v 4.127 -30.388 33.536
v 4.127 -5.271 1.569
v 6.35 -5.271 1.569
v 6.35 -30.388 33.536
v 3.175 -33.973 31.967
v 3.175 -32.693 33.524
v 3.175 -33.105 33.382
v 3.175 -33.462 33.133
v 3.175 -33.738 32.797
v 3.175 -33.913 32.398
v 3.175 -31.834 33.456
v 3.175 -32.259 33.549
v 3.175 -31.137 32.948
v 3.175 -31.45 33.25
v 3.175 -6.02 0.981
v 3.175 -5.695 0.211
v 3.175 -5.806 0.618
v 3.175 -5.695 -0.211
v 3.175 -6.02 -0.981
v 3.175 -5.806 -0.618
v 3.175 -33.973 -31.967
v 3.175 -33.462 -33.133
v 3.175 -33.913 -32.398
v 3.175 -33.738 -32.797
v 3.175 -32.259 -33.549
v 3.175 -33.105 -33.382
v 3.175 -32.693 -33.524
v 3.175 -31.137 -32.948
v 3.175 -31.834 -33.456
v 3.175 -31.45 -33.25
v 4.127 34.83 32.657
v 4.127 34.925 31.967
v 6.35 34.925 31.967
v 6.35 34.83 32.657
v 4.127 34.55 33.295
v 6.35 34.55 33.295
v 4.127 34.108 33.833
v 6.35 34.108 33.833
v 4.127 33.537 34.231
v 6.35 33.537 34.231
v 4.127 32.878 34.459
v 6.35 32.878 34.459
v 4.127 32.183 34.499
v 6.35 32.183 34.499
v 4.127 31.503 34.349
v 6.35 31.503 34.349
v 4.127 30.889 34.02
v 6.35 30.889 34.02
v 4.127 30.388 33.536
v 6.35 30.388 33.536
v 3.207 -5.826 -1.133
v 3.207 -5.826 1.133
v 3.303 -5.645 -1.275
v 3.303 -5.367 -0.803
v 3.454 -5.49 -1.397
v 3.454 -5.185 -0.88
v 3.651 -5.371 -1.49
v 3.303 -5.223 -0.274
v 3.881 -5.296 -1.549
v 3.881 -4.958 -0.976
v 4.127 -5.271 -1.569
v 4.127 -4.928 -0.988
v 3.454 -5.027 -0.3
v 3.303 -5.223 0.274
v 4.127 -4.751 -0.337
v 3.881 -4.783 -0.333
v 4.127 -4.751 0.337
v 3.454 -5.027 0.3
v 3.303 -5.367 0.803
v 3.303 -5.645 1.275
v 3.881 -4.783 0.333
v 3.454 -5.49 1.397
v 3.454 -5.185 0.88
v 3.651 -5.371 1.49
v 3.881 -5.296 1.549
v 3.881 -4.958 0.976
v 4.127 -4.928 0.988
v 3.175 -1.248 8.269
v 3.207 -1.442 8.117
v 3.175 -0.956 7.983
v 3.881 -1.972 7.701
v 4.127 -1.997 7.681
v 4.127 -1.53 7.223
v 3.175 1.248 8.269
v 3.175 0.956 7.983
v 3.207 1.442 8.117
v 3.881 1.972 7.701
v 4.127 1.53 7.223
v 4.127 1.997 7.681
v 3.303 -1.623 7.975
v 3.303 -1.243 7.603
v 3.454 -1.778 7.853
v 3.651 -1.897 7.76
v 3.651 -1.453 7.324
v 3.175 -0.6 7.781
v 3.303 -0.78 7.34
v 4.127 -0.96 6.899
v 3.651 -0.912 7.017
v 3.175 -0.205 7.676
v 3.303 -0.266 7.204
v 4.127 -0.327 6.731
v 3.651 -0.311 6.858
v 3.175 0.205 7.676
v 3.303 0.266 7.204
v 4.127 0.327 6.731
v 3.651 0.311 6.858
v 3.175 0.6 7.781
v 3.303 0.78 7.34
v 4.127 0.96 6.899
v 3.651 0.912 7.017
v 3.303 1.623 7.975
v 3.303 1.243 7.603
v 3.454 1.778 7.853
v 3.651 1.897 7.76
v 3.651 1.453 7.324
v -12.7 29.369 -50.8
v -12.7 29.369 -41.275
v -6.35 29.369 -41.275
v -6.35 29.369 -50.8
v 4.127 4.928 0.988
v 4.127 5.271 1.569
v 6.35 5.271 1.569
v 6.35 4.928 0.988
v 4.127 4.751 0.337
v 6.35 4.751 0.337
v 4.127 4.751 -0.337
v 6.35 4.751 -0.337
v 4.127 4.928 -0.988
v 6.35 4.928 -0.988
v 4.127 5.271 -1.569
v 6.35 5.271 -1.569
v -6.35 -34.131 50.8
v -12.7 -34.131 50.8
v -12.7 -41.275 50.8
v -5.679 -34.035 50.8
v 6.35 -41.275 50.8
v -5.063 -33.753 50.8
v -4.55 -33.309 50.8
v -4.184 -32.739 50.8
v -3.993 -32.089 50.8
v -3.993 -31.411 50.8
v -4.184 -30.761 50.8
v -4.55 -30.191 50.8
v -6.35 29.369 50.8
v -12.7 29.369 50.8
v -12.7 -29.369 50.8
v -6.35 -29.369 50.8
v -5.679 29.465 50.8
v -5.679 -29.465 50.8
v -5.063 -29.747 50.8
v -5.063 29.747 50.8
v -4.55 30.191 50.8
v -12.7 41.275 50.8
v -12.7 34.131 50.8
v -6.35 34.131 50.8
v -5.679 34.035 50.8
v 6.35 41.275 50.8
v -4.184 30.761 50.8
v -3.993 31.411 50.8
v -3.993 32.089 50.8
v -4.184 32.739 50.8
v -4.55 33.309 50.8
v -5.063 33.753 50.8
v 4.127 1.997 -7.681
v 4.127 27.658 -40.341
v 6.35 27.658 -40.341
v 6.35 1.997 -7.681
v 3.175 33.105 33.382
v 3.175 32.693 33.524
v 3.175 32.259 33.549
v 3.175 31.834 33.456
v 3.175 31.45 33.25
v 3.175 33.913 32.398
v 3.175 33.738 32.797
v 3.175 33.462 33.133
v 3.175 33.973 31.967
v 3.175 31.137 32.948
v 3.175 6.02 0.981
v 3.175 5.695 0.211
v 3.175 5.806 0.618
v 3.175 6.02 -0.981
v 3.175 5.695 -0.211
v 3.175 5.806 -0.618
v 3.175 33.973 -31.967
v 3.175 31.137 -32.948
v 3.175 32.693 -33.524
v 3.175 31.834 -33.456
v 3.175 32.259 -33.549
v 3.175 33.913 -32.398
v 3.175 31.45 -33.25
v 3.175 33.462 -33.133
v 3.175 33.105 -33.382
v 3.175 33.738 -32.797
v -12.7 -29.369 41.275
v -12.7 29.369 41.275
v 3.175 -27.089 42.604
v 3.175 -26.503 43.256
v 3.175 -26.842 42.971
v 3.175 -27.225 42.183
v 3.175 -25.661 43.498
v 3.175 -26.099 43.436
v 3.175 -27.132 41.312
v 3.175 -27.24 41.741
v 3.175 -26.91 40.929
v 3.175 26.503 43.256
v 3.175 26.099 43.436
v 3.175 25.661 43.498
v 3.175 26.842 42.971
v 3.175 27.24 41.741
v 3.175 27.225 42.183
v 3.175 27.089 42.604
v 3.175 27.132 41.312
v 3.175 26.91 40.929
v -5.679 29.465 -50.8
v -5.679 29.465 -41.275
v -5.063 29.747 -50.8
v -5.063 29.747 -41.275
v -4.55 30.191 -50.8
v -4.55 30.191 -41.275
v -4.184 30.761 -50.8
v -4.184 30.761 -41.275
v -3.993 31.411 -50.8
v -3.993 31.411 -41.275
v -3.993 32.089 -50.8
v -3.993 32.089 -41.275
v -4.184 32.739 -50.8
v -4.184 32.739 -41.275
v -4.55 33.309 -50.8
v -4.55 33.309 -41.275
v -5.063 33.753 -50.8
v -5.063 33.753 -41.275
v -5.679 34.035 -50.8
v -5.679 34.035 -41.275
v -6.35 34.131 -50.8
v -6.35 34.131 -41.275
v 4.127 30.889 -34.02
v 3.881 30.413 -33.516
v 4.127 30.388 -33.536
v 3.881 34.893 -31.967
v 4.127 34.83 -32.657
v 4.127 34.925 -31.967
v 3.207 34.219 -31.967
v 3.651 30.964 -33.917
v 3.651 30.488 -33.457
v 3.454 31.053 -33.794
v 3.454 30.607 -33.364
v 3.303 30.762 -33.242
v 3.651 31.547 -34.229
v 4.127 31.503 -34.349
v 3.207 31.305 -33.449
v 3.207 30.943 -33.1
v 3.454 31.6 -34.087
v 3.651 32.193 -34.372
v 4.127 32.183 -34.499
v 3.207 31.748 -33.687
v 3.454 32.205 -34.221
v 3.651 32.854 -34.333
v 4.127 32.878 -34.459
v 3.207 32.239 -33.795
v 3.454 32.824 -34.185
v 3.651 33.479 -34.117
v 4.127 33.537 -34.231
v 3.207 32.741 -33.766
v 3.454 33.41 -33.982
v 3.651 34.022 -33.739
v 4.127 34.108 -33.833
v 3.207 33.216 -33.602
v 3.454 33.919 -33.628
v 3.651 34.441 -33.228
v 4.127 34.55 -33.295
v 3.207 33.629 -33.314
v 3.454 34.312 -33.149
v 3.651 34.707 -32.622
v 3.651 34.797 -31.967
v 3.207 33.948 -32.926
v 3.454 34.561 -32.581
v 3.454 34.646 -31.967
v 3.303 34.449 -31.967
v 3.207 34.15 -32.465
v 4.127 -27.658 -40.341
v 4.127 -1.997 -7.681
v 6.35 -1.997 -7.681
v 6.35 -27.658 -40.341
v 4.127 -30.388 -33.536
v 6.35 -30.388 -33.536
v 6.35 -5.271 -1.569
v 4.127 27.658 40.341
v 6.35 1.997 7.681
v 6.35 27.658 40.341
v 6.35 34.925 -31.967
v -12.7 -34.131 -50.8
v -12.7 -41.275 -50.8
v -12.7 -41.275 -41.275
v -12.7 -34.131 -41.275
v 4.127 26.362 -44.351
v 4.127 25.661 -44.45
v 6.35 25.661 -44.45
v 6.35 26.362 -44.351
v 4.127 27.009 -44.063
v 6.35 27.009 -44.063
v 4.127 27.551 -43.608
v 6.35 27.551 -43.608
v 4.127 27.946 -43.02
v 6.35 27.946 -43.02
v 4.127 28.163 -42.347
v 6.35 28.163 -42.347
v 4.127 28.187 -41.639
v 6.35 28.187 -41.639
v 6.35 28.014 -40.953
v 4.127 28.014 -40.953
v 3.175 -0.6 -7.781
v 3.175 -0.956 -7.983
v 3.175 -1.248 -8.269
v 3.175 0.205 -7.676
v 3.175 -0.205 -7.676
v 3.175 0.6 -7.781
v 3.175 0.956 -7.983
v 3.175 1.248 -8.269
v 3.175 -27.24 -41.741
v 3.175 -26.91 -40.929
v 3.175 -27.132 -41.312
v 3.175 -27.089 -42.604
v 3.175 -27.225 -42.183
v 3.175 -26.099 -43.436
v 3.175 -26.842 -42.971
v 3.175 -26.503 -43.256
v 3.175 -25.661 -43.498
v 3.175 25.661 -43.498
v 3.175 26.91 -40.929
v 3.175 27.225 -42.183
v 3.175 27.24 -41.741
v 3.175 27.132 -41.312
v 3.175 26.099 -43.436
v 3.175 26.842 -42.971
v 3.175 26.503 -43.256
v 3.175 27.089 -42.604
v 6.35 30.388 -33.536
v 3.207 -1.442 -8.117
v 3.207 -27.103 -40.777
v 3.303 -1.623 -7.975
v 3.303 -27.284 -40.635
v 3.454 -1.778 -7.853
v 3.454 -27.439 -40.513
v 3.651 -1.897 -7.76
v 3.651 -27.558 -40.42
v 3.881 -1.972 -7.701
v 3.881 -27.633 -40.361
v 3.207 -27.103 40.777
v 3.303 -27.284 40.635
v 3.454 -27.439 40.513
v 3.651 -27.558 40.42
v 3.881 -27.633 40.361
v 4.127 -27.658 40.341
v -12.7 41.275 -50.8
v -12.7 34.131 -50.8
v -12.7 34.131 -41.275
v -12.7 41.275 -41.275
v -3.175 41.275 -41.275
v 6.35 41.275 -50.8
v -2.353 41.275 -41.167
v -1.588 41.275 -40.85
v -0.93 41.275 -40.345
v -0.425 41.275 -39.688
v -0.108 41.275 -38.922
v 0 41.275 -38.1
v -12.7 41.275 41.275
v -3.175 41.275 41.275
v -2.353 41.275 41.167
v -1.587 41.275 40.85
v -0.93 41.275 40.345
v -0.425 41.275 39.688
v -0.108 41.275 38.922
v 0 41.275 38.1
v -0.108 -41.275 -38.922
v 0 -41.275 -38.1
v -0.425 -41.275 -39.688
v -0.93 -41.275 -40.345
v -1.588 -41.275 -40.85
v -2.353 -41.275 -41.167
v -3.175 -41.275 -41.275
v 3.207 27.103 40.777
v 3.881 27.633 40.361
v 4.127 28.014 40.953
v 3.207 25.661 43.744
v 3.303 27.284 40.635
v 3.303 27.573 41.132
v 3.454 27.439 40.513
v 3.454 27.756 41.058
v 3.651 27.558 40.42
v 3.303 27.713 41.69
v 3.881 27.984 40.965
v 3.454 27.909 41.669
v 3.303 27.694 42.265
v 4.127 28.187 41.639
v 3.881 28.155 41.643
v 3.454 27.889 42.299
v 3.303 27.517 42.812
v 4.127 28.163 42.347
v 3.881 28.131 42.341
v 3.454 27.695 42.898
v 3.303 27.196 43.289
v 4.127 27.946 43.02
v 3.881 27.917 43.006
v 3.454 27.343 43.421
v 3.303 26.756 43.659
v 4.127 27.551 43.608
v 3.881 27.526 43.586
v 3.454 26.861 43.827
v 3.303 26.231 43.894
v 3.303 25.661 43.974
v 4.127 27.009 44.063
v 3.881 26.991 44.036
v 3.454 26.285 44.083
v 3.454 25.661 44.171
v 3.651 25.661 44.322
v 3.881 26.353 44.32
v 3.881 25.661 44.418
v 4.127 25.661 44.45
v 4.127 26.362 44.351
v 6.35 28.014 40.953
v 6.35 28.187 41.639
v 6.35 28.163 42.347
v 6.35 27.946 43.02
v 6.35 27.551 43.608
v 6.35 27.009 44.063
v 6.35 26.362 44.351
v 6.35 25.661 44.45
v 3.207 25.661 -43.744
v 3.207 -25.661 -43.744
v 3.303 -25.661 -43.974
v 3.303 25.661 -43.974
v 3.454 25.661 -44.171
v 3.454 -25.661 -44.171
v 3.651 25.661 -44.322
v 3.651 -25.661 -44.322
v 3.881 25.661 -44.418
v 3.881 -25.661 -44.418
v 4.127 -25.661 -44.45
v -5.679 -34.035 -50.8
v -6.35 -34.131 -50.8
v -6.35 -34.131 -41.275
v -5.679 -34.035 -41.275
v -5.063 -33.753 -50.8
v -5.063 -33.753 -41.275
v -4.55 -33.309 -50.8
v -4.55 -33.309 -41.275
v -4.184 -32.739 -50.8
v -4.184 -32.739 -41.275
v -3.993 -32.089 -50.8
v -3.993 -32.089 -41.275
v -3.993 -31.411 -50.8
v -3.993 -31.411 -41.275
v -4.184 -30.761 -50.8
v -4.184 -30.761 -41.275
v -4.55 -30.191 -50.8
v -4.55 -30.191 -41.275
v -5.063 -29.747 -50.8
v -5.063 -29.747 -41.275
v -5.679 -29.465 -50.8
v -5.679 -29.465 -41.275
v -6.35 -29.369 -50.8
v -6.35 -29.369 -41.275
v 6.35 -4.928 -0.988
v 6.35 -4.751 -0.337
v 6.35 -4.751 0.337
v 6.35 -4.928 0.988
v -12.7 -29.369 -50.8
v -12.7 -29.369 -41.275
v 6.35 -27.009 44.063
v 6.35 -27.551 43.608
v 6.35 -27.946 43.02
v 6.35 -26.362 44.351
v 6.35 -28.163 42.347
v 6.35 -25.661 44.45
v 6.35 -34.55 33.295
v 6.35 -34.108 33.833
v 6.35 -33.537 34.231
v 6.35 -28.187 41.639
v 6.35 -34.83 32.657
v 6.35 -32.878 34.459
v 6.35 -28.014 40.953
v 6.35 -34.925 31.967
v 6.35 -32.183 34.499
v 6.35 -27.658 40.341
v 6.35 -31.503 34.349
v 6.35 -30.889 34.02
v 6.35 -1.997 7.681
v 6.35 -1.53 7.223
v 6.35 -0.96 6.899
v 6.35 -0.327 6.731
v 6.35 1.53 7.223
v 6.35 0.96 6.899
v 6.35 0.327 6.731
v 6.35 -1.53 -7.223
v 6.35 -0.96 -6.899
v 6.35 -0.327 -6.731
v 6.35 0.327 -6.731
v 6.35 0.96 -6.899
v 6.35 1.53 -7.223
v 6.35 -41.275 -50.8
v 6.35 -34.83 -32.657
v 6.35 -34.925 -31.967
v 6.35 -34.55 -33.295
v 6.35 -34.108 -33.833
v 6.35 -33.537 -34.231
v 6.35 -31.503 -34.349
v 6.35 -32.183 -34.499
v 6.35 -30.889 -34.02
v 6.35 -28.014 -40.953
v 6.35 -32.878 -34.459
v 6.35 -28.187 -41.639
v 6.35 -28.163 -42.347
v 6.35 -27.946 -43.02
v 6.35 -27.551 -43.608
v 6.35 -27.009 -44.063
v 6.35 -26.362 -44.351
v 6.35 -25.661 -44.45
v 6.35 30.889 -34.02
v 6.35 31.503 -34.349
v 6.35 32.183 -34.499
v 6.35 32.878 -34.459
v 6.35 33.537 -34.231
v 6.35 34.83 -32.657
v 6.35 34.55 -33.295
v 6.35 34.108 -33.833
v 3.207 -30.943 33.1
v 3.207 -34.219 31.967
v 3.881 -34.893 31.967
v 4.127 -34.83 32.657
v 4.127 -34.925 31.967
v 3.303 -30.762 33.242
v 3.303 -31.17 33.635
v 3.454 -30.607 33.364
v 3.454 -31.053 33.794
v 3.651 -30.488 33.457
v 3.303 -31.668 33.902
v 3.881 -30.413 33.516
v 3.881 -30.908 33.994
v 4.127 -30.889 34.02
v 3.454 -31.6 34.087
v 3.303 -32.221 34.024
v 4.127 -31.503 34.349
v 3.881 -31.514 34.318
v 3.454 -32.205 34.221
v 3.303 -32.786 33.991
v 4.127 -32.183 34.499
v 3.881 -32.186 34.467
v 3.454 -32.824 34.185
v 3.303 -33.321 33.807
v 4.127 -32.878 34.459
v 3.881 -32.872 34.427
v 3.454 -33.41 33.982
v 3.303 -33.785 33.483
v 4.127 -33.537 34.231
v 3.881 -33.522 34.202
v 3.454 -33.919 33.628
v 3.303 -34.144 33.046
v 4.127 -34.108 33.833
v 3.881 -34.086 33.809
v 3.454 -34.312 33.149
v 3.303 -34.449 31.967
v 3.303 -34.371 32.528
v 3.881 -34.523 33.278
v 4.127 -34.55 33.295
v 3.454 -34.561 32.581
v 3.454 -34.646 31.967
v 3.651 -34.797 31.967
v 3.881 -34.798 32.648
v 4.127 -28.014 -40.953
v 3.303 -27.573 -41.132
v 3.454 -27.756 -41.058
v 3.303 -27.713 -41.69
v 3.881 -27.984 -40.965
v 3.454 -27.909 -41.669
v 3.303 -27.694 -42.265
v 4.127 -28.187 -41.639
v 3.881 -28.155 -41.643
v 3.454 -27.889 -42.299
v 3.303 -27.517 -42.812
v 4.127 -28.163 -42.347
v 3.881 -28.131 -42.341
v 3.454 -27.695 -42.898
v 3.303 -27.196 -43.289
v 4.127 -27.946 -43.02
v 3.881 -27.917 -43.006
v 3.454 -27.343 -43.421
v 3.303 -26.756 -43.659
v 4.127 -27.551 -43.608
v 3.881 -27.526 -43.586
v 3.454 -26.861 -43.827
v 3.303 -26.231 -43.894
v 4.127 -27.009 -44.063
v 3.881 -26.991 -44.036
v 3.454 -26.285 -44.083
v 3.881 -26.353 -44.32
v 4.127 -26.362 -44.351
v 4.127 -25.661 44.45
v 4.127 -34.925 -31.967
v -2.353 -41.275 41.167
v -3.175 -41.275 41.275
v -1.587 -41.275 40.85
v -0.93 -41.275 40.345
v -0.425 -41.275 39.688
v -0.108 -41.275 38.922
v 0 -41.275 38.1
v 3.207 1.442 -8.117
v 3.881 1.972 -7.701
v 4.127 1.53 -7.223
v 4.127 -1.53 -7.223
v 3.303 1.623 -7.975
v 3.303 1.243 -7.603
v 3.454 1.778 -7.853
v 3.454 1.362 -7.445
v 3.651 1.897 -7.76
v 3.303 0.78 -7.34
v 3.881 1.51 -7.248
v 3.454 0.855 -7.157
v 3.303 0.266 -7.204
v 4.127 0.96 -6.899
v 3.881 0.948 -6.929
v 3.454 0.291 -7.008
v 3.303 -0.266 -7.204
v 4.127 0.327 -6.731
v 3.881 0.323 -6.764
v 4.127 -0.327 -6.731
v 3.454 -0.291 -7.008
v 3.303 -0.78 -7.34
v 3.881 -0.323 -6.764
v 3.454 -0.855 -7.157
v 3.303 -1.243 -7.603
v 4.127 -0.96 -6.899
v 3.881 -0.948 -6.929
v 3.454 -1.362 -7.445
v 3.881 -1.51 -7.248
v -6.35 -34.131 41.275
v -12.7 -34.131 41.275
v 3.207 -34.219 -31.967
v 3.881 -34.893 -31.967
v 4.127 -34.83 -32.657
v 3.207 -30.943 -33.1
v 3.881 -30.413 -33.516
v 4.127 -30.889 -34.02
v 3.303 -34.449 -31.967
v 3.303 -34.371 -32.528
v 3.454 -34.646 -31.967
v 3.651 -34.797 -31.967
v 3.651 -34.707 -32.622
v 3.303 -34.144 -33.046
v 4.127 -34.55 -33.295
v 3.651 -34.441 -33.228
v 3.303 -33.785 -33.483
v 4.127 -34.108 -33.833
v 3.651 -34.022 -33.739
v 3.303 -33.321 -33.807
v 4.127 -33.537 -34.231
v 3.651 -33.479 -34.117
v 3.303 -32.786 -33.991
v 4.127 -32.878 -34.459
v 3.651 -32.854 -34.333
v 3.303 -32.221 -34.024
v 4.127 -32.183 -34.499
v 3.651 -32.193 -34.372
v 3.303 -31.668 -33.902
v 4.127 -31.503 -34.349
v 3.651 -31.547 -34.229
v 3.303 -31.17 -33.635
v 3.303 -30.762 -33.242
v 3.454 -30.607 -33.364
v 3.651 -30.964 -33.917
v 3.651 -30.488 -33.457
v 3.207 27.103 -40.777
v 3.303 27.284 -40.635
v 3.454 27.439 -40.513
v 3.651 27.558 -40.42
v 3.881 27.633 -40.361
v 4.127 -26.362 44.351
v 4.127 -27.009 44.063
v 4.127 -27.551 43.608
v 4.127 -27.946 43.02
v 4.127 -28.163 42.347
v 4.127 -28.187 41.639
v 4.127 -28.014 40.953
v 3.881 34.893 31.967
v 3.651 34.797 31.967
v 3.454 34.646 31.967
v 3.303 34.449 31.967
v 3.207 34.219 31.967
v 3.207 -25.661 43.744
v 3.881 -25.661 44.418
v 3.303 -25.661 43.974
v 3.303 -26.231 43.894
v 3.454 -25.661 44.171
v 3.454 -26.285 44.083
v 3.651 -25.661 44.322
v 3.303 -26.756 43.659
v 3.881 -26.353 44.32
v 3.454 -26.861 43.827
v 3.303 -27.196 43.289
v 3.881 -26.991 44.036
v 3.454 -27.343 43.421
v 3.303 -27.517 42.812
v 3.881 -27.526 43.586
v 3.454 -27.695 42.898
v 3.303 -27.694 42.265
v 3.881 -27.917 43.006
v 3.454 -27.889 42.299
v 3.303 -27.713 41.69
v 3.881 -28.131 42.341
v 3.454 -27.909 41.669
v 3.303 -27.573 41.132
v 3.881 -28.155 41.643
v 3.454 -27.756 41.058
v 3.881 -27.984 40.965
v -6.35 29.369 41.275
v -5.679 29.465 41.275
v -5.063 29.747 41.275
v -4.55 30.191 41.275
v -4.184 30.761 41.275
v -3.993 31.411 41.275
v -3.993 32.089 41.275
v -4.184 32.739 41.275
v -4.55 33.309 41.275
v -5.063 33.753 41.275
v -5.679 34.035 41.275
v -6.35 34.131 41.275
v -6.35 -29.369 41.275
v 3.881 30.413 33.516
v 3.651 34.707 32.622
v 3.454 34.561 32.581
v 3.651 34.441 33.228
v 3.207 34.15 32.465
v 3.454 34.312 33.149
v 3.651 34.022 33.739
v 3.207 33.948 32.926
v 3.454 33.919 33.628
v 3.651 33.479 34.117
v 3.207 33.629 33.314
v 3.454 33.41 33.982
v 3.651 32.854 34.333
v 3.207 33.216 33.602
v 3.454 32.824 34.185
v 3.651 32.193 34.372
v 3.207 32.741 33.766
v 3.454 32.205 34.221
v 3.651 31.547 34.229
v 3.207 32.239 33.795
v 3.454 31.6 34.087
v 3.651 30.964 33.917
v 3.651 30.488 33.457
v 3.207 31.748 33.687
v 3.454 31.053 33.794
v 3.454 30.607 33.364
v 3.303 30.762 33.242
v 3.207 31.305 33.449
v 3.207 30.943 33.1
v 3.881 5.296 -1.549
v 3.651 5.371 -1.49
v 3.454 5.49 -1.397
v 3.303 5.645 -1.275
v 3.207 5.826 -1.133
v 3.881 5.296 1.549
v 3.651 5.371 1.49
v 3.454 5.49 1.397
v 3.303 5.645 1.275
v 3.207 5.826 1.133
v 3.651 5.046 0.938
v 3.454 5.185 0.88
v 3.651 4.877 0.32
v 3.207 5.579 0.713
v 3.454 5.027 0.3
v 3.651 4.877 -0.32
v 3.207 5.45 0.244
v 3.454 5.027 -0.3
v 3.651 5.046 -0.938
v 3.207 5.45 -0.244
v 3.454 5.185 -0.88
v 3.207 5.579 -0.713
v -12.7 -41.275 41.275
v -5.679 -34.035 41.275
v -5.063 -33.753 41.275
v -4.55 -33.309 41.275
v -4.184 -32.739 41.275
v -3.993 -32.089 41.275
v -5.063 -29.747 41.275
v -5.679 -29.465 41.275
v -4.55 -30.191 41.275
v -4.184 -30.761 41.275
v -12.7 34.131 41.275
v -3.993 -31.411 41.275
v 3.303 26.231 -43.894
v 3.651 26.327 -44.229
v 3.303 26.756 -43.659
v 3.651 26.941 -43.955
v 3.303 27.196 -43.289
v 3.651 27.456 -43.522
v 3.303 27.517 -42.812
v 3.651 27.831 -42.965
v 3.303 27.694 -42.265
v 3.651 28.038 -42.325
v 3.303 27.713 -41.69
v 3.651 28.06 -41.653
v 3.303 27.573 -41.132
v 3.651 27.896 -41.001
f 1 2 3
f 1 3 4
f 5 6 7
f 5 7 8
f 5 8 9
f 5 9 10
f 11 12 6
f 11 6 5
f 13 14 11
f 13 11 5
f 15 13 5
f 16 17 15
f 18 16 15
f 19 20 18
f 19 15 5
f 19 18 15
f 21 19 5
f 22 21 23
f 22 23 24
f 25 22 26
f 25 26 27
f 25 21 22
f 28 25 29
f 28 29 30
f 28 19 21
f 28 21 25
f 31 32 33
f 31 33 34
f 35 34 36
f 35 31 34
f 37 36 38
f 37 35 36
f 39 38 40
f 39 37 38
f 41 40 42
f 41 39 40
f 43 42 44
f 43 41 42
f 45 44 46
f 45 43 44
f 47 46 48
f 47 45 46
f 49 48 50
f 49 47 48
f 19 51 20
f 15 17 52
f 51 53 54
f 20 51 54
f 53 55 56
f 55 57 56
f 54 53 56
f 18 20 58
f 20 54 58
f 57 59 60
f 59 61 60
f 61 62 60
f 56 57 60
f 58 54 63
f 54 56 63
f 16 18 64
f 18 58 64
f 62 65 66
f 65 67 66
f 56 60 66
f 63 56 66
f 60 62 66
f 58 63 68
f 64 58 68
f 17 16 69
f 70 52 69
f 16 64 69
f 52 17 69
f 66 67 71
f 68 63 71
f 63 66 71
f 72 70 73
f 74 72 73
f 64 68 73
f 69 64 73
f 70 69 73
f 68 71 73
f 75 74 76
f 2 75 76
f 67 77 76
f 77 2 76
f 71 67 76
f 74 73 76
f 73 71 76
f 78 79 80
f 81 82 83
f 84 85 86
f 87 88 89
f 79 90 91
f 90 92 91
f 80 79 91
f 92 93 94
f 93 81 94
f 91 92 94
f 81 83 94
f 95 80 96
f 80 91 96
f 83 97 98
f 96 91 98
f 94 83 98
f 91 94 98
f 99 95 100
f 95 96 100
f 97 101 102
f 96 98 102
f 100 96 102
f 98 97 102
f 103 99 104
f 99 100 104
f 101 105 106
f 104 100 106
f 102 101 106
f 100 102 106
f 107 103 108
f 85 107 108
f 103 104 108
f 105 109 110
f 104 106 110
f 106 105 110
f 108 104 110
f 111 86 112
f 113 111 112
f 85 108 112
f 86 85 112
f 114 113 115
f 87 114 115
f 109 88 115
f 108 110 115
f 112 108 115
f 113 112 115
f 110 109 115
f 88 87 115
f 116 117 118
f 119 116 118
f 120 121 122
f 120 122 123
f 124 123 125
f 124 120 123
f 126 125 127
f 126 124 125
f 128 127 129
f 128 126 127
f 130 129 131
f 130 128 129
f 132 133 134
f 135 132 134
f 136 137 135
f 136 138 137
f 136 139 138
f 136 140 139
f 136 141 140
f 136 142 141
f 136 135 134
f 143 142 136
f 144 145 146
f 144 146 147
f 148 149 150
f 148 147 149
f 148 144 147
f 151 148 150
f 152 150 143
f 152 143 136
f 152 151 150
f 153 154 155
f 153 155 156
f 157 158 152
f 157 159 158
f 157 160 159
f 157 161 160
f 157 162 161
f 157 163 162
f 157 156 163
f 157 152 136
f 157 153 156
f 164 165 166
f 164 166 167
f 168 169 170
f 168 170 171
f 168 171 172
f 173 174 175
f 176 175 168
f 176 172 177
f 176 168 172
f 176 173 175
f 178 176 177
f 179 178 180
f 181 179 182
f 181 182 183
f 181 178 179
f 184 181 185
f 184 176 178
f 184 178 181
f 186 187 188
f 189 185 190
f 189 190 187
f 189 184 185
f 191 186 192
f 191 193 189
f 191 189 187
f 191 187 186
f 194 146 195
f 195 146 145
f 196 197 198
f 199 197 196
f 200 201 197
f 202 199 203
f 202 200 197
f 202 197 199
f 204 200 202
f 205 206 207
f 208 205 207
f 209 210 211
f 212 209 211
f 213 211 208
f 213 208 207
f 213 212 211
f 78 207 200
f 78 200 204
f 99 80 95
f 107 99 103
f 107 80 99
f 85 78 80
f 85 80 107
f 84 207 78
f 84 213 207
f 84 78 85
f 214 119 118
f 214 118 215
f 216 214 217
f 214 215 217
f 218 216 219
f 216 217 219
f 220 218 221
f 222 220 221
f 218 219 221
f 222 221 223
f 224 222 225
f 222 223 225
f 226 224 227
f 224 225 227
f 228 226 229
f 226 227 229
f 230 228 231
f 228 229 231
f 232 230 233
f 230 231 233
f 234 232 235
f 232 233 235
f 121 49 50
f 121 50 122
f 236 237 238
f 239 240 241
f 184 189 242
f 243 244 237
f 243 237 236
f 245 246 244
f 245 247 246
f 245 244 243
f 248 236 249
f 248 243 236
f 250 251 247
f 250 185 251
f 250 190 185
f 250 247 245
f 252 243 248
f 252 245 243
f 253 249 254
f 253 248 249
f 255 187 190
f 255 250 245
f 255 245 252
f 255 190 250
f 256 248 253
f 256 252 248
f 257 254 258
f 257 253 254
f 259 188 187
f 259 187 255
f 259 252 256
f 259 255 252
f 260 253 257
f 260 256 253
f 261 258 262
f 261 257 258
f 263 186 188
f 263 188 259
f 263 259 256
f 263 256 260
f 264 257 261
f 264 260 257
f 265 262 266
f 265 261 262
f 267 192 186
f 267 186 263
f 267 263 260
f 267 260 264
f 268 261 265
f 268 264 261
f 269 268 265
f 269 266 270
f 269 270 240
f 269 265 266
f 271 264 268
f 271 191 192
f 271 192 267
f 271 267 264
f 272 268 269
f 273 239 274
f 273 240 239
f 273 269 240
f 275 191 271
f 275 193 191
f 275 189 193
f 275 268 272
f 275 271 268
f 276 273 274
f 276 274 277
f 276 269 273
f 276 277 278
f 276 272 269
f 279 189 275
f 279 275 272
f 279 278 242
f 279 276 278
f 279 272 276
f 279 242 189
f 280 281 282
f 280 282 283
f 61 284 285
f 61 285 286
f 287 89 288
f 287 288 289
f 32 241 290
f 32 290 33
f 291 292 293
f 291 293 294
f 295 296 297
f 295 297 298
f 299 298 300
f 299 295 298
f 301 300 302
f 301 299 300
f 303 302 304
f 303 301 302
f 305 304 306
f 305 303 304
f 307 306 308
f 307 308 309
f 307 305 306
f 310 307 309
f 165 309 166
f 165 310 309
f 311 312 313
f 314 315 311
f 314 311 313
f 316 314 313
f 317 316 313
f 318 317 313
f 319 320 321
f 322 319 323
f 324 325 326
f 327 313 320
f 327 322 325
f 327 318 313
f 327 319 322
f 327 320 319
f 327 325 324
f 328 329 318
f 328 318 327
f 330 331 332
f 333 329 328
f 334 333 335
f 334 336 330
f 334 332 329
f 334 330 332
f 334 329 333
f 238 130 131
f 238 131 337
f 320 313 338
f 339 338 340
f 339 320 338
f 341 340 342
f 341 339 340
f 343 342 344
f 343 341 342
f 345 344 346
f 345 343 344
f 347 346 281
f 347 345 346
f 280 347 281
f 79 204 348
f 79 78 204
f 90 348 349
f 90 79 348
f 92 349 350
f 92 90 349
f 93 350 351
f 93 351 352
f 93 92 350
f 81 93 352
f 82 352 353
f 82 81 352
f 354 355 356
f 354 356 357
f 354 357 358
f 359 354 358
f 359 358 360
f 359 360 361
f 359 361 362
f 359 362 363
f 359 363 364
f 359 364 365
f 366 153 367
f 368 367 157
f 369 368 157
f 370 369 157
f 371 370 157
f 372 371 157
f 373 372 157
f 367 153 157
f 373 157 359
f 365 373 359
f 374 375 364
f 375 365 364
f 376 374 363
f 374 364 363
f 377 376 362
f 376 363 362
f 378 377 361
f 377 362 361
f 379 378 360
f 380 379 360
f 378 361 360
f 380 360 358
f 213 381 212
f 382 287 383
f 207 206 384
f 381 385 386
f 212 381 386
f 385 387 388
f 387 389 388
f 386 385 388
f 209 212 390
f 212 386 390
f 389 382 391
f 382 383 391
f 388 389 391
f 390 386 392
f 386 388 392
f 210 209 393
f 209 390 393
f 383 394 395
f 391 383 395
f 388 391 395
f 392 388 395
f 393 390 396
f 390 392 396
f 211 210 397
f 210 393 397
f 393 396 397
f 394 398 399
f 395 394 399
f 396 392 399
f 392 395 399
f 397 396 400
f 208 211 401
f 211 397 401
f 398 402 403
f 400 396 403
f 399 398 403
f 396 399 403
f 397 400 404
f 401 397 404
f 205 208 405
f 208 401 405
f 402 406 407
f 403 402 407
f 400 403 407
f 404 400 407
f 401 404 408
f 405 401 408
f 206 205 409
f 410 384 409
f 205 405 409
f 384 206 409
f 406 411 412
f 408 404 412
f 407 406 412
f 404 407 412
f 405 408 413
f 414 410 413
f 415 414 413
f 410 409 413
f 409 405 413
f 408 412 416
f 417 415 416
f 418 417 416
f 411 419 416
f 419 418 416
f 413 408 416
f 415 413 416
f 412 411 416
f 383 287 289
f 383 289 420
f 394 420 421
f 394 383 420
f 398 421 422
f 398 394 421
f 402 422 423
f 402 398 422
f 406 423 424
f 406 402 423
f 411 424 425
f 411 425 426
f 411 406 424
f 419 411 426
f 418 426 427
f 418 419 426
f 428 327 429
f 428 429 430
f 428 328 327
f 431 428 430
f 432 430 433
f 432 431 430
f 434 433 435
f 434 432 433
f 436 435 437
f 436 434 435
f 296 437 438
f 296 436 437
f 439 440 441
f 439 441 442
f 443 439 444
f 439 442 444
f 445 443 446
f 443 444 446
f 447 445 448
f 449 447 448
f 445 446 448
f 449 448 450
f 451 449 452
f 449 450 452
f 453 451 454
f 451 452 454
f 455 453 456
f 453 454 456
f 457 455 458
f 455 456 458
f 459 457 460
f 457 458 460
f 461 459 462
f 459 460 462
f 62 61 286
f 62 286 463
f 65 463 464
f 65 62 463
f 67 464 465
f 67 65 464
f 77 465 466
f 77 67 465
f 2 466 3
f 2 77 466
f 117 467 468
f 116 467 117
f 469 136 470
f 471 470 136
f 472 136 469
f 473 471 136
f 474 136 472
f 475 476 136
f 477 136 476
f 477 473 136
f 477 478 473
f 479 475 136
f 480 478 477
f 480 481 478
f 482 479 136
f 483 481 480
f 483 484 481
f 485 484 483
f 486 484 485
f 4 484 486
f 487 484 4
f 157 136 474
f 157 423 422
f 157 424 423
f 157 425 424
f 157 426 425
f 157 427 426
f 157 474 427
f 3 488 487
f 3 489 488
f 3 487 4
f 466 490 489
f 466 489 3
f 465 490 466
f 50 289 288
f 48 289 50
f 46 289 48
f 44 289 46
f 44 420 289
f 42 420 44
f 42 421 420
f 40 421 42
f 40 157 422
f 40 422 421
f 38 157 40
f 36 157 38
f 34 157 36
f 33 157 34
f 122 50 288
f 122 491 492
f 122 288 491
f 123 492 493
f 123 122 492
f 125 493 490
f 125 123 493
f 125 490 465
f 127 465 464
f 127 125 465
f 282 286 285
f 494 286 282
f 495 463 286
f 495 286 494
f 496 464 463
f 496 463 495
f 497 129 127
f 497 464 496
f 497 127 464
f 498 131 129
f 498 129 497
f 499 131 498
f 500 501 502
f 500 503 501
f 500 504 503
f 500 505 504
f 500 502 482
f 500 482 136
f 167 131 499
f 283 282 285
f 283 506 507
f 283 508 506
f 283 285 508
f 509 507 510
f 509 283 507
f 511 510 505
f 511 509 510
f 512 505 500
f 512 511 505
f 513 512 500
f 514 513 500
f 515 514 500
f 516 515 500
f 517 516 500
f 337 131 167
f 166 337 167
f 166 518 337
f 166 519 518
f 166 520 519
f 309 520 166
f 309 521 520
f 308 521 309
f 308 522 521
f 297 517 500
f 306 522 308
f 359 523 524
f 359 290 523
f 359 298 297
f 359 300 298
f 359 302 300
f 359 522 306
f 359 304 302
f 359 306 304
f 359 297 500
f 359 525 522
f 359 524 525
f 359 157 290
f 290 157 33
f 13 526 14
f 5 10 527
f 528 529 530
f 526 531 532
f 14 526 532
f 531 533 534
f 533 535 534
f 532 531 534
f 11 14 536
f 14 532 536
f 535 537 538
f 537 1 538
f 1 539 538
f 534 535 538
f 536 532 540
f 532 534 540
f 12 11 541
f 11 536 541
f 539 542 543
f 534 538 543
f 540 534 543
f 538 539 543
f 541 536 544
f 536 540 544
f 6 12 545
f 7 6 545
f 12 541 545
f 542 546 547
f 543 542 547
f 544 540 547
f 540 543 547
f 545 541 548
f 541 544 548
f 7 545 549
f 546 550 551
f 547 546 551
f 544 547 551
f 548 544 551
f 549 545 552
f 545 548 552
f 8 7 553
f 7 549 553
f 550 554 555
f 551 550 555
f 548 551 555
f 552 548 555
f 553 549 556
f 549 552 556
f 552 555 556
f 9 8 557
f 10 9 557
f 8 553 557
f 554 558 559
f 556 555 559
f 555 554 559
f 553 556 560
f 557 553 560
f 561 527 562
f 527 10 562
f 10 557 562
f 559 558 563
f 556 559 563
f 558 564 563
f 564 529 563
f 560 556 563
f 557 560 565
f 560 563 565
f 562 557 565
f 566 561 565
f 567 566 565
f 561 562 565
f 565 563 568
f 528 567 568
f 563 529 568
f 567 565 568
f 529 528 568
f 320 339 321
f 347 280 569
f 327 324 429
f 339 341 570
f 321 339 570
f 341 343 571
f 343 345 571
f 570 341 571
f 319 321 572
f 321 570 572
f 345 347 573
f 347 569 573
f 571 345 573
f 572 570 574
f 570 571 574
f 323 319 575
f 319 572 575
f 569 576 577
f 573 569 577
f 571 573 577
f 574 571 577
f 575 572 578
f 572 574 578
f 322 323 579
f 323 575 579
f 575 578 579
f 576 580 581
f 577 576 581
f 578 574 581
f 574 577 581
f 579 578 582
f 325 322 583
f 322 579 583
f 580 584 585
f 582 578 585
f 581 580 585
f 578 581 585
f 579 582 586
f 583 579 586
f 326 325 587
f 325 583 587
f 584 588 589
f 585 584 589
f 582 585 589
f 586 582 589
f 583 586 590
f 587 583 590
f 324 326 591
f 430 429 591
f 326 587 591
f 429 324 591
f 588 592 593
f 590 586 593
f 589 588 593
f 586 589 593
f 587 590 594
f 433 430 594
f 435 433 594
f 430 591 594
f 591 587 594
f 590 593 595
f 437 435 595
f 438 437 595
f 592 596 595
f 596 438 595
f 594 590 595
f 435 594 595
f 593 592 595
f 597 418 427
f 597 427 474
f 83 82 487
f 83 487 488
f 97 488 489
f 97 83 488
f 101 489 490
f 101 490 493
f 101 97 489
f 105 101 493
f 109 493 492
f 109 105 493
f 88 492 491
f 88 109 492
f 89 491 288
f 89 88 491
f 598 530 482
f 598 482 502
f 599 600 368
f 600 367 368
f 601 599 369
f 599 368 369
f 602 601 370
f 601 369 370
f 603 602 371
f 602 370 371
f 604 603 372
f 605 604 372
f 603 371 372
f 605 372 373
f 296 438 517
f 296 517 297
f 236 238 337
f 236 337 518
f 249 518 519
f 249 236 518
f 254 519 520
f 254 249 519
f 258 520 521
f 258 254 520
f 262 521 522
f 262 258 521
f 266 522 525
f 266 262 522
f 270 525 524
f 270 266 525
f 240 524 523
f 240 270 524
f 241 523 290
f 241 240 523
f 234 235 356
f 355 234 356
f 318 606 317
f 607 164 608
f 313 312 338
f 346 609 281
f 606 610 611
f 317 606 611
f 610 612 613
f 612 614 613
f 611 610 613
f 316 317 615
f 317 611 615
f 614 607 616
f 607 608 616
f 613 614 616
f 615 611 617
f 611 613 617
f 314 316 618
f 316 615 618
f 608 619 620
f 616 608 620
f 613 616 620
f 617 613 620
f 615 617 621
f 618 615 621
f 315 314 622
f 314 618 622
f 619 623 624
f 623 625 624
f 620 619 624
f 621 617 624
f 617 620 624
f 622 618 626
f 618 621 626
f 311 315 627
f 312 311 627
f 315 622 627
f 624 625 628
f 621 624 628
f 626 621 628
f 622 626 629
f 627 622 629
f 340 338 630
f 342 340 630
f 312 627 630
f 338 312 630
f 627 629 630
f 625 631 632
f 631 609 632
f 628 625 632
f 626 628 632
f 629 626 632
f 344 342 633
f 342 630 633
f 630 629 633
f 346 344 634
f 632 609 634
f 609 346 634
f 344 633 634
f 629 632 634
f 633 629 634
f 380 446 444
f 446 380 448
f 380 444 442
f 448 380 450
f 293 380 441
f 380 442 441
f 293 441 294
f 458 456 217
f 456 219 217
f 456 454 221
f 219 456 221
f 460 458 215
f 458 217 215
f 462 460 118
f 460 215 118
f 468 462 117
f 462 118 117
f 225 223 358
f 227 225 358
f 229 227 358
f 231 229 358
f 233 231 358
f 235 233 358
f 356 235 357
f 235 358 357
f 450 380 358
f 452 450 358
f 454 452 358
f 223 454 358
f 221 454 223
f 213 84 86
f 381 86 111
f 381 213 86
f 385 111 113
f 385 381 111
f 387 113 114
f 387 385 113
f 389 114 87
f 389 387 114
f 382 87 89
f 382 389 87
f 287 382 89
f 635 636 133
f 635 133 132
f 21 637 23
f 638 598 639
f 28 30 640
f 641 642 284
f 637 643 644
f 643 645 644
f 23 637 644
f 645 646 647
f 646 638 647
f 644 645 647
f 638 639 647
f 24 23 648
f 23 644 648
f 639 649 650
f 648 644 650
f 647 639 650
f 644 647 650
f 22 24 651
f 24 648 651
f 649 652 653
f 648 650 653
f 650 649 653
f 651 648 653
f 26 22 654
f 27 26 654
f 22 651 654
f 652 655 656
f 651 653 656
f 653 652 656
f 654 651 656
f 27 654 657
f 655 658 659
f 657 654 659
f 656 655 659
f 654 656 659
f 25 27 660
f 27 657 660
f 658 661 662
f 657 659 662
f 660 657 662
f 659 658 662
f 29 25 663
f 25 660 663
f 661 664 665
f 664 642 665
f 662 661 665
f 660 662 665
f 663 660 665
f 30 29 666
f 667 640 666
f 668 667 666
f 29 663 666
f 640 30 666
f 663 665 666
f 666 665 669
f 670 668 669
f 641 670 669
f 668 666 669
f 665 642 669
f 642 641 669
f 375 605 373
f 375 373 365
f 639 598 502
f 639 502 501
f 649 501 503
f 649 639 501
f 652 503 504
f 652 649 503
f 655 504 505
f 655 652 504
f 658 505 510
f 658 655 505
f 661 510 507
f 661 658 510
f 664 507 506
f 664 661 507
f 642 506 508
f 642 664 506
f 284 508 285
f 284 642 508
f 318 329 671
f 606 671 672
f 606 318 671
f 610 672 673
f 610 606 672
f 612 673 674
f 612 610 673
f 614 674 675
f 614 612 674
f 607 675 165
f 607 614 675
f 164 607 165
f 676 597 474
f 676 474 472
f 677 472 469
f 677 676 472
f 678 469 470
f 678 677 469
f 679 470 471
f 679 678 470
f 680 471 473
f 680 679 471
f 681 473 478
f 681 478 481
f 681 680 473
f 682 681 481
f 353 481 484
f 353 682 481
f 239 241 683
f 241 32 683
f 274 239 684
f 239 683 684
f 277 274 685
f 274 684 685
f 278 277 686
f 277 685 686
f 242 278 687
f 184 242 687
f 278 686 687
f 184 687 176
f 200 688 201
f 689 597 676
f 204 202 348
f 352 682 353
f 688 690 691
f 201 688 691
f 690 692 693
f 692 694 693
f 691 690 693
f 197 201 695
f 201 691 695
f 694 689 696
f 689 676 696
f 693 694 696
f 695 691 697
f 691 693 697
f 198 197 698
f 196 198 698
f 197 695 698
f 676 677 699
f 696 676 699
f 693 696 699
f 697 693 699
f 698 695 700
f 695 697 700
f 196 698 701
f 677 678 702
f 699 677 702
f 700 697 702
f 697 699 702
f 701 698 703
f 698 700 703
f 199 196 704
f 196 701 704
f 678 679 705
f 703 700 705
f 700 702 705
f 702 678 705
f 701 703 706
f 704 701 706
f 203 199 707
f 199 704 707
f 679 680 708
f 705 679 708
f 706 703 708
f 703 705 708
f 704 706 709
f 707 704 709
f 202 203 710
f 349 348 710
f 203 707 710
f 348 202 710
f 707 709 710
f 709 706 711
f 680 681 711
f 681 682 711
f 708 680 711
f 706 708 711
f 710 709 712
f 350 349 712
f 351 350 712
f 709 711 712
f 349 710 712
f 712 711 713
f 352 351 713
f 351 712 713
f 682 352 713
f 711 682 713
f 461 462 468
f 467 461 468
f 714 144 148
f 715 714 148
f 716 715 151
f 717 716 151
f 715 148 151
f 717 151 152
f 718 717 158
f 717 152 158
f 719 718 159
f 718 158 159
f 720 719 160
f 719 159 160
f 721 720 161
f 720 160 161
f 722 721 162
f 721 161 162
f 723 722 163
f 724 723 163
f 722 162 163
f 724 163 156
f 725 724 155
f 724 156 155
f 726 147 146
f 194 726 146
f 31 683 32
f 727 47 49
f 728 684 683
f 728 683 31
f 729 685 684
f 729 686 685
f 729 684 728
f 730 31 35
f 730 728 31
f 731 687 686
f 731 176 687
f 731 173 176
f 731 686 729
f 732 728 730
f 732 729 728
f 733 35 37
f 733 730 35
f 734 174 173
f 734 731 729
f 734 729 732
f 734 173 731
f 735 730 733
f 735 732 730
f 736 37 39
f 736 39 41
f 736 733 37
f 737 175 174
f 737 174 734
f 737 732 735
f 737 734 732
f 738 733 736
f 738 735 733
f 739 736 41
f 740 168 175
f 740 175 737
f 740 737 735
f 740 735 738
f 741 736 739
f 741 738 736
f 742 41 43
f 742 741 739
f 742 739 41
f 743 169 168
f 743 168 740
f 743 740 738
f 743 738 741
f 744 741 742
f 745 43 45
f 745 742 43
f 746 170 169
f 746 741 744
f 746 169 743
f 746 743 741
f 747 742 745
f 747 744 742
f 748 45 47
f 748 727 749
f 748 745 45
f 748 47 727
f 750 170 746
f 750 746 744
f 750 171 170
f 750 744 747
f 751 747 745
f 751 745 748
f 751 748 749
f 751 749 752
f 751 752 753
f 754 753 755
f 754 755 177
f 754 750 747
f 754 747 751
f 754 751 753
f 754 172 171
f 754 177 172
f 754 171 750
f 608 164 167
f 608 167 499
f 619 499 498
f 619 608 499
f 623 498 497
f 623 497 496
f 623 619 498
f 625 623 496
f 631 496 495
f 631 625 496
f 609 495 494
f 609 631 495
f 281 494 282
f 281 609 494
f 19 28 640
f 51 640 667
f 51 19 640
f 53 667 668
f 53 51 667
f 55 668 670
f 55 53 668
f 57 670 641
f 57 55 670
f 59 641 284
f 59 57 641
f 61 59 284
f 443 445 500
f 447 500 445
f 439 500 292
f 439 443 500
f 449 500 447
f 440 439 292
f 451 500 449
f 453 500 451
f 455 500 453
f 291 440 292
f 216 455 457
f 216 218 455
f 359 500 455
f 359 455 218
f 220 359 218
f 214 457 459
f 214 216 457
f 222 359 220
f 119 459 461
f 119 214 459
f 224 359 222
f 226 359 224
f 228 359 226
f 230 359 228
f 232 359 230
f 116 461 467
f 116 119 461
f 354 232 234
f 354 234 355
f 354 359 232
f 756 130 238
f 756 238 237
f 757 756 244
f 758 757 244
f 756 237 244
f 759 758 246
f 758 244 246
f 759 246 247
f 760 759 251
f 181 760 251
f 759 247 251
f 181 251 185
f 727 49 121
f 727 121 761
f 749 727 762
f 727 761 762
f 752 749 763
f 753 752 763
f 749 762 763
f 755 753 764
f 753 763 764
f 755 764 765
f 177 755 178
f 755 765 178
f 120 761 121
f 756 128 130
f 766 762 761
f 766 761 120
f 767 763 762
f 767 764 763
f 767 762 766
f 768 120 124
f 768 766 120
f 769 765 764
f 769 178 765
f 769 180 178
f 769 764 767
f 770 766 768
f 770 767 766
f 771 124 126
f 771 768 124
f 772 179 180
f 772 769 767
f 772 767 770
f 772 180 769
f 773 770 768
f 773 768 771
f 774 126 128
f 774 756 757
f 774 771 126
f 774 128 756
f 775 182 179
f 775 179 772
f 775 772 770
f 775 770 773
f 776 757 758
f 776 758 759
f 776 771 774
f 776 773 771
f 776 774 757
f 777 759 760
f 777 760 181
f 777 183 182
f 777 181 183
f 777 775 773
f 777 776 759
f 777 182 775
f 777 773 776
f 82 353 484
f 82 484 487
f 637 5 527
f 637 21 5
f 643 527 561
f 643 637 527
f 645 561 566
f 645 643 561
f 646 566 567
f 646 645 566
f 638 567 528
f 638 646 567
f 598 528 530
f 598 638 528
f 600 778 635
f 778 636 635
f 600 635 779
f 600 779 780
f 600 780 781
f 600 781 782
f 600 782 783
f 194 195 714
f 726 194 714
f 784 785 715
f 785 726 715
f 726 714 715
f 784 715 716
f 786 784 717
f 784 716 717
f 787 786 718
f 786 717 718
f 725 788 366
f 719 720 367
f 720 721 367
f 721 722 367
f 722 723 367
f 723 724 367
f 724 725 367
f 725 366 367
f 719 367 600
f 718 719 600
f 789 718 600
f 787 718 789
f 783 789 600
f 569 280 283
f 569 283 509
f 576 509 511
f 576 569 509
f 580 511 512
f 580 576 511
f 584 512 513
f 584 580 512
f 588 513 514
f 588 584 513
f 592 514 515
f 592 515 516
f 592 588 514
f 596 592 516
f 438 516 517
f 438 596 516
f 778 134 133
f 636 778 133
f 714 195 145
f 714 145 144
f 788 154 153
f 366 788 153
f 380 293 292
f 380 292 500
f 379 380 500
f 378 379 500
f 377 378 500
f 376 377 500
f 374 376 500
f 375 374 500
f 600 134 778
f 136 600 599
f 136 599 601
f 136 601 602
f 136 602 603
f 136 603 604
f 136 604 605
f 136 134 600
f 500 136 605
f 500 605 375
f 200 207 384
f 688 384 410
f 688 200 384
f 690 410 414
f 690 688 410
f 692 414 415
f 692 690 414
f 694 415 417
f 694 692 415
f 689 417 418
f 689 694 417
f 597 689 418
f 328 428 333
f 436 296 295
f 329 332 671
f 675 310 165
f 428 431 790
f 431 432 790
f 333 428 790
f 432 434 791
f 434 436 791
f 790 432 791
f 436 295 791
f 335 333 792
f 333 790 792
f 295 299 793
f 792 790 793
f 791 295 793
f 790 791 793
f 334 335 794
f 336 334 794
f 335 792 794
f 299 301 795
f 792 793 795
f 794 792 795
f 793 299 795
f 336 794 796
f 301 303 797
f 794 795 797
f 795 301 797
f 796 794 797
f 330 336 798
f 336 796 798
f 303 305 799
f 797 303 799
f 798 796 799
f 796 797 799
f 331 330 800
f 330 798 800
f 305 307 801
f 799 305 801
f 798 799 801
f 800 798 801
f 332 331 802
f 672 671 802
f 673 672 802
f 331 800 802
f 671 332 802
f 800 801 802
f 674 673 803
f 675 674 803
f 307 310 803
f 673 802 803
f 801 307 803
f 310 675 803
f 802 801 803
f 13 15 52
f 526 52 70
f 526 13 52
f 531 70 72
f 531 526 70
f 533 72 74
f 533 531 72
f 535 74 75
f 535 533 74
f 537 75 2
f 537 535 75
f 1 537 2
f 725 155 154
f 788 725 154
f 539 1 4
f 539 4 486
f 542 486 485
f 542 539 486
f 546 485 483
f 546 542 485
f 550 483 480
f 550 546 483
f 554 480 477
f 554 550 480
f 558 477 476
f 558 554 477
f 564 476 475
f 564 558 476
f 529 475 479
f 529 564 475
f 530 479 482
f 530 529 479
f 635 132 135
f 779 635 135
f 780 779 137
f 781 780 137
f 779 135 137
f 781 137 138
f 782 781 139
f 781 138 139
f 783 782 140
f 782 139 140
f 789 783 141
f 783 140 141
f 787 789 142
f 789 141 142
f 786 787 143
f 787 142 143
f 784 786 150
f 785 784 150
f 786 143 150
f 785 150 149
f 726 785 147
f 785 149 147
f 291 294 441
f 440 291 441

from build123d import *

# Parameters (mm, degrees)
SKETCH1_W           = 101.6
SKETCH1_H           = 82.55
BOSS_EXTRUDE1_DEPTH = 3.175
SKETCH2_W           = 101.6
SKETCH2_H           = 82.55
BOSS_EXTRUDE2_DEPTH = 3.175
FILLET1_R           = 0.9525
SKETCH3_W           = 12.7
SKETCH3_H           = 82.55
BOSS_EXTRUDE3_DEPTH = 9.525
SKETCH4_W           = 12.7
SKETCH4_H           = 82.55
BOSS_EXTRUDE4_DEPTH = 9.525
FILLET2_R           = 3.175
CUT_EXTRUDE2_DEPTH  = 111.396900432


with BuildPart() as part:
    # Sketch1 → Boss-Extrude1 (new body)
    with BuildSketch(Plane(origin=(0, 0, 0), x_dir=(0, 0, -1), z_dir=(1, 0, 0))):
        Rectangle(SKETCH1_W, SKETCH1_H)
    extrude(amount=BOSS_EXTRUDE1_DEPTH)

    # Sketch2 → Boss-Extrude2 (add)
    with BuildSketch(Plane(origin=(3.175, 0, 0), x_dir=(0, 0, -1), z_dir=(1, 0, 0))):
        Rectangle(SKETCH2_W, SKETCH2_H)
        with BuildLine():
            ThreePointArc((-40.340733258, 27.65848557), (-43.020329338, 27.945699456), (-44.45, 25.661236989))
            Line((-44.45, 25.661236989), (-44.45, -25.661236989))
            ThreePointArc((-44.45, -25.661236989), (-43.020329338, -27.945699456), (-40.340733258, -27.65848557))
            Line((-40.340733258, -27.65848557), (-7.68097709, -1.997248581))
            ThreePointArc((-7.68097709, -1.997248581), (-6.710243832, 0), (-7.68097709, 1.997248581))
            Line((-7.68097709, 1.997248581), (-40.340733258, 27.65848557))
        make_face(mode=Mode.SUBTRACT)
        with BuildLine():
            Line((33.536295637, -30.387751419), (1.569266742, -5.270800144))
            ThreePointArc((1.569266742, -5.270800144), (0, -4.728048725), (-1.569266742, -5.270800144))
            Line((-1.569266742, -5.270800144), (-33.536295637, -30.387751419))
            ThreePointArc((-33.536295637, -30.387751419), (-34.367509201, -33.215237498), (-31.967028895, -34.925))
            Line((-31.967028895, -34.925), (31.967028895, -34.925))
            ThreePointArc((31.967028895, -34.925), (34.367509201, -33.215237498), (33.536295637, -30.387751419))
        make_face(mode=Mode.SUBTRACT)
        with BuildLine():
            Line((40.340733258, 27.65848557), (7.68097709, 1.997248581))
            ThreePointArc((7.68097709, 1.997248581), (6.710243832, 0), (7.68097709, -1.997248581))
            Line((7.68097709, -1.997248581), (40.340733258, -27.65848557))
            ThreePointArc((40.340733258, -27.65848557), (43.020329338, -27.945699456), (44.45, -25.661236989))
            Line((44.45, -25.661236989), (44.45, 25.661236989))
            ThreePointArc((44.45, 25.661236989), (43.020329338, 27.945699456), (40.340733258, 27.65848557))
        make_face(mode=Mode.SUBTRACT)
        with BuildLine():
            Line((-33.536295637, 30.387751419), (-1.569266742, 5.270800144))
            ThreePointArc((-1.569266742, 5.270800144), (0, 4.728048725), (1.569266742, 5.270800144))
            Line((1.569266742, 5.270800144), (33.536295637, 30.387751419))
            ThreePointArc((33.536295637, 30.387751419), (34.367509201, 33.215237498), (31.967028895, 34.925))
            Line((31.967028895, 34.925), (-31.967028895, 34.925))
            ThreePointArc((-31.967028895, 34.925), (-34.367509201, 33.215237498), (-33.536295637, 30.387751419))
        make_face(mode=Mode.SUBTRACT)
    extrude(amount=BOSS_EXTRUDE2_DEPTH)

    # Fillet1
    fillet1_edges = [part.edges().sort_by_distance(p)[0] for p in [
        (3.175, 33.215237498, 34.367509201),
        (3.175, 17.829275782, -17.55278119),
        (3.175, 27.945699456, -43.020329338),
        (3.175, -33.215237498, -34.367509201),
        (3.175, -34.925, 0),
        (3.175, 0, 6.710243832),
        (3.175, -14.827867075, 24.010855174),
        (3.175, -27.945699456, 43.020329338),
        (3.175, 0, -6.710243832),
        (3.175, -4.728048725, 0),
        (3.175, 0, 44.45),
        (3.175, 4.728048725, 0),
        (3.175, 27.945699456, 43.020329338),
        (3.175, 14.827867075, 24.010855174),
        (3.175, -17.829275782, -17.55278119),
        (3.175, -17.829275782, 17.55278119),
        (3.175, -33.215237498, 34.367509201),
        (3.175, 14.827867075, -24.010855174),
        (3.175, -14.827867075, -24.010855174),
        (3.175, -27.945699456, -43.020329338),
        (3.175, 0, -44.45),
        (3.175, 17.829275782, 17.55278119),
        (3.175, 33.215237498, -34.367509201),
        (3.175, 34.925, 0),
    ]]
    fillet(fillet1_edges, radius=FILLET1_R)

    # Sketch3 → Boss-Extrude3 (add)
    with BuildSketch(Plane(origin=(0, 0, -50.8), x_dir=(-1, 0, 0), z_dir=(0, 0, -1))):
        with Locations((6.35, 0)):
            Rectangle(SKETCH3_W, SKETCH3_H)
    extrude(amount=-BOSS_EXTRUDE3_DEPTH)

    # Sketch4 → Boss-Extrude4 (add)
    with BuildSketch(Plane.XY.offset(50.8)):
        with Locations((-6.35, 0)):
            Rectangle(SKETCH4_W, SKETCH4_H)
    extrude(amount=-BOSS_EXTRUDE4_DEPTH)

    # Fillet2
    fillet2_edges = [part.edges().sort_by_distance(p)[0] for p in [
        (0, 0, 41.275),
        (0, 0, -41.275),
    ]]
    fillet(fillet2_edges, radius=FILLET2_R)

    # Sketch5 → Cut-Extrude2 (cut, through all)
    with BuildSketch(Plane.XY.offset(50.8)):
        with BuildLine():
            Line((-12.7, 29.36875), (-6.35, 29.36875))
            ThreePointArc((-6.35, 29.36875), (-3.96875, 31.75), (-6.35, 34.13125))
            Line((-6.35, 34.13125), (-12.7, 34.13125))
            Line((-12.7, 34.13125), (-12.7, 29.36875))
        make_face()
        with BuildLine():
            Line((-12.7, -34.13125), (-6.35, -34.13125))
            ThreePointArc((-6.35, -34.13125), (-3.96875, -31.75), (-6.35, -29.36875))
            Line((-6.35, -29.36875), (-12.7, -29.36875))
            Line((-12.7, -29.36875), (-12.7, -34.13125))
        make_face()
    extrude(amount=-CUT_EXTRUDE2_DEPTH, mode=Mode.SUBTRACT)


solid = part.part
